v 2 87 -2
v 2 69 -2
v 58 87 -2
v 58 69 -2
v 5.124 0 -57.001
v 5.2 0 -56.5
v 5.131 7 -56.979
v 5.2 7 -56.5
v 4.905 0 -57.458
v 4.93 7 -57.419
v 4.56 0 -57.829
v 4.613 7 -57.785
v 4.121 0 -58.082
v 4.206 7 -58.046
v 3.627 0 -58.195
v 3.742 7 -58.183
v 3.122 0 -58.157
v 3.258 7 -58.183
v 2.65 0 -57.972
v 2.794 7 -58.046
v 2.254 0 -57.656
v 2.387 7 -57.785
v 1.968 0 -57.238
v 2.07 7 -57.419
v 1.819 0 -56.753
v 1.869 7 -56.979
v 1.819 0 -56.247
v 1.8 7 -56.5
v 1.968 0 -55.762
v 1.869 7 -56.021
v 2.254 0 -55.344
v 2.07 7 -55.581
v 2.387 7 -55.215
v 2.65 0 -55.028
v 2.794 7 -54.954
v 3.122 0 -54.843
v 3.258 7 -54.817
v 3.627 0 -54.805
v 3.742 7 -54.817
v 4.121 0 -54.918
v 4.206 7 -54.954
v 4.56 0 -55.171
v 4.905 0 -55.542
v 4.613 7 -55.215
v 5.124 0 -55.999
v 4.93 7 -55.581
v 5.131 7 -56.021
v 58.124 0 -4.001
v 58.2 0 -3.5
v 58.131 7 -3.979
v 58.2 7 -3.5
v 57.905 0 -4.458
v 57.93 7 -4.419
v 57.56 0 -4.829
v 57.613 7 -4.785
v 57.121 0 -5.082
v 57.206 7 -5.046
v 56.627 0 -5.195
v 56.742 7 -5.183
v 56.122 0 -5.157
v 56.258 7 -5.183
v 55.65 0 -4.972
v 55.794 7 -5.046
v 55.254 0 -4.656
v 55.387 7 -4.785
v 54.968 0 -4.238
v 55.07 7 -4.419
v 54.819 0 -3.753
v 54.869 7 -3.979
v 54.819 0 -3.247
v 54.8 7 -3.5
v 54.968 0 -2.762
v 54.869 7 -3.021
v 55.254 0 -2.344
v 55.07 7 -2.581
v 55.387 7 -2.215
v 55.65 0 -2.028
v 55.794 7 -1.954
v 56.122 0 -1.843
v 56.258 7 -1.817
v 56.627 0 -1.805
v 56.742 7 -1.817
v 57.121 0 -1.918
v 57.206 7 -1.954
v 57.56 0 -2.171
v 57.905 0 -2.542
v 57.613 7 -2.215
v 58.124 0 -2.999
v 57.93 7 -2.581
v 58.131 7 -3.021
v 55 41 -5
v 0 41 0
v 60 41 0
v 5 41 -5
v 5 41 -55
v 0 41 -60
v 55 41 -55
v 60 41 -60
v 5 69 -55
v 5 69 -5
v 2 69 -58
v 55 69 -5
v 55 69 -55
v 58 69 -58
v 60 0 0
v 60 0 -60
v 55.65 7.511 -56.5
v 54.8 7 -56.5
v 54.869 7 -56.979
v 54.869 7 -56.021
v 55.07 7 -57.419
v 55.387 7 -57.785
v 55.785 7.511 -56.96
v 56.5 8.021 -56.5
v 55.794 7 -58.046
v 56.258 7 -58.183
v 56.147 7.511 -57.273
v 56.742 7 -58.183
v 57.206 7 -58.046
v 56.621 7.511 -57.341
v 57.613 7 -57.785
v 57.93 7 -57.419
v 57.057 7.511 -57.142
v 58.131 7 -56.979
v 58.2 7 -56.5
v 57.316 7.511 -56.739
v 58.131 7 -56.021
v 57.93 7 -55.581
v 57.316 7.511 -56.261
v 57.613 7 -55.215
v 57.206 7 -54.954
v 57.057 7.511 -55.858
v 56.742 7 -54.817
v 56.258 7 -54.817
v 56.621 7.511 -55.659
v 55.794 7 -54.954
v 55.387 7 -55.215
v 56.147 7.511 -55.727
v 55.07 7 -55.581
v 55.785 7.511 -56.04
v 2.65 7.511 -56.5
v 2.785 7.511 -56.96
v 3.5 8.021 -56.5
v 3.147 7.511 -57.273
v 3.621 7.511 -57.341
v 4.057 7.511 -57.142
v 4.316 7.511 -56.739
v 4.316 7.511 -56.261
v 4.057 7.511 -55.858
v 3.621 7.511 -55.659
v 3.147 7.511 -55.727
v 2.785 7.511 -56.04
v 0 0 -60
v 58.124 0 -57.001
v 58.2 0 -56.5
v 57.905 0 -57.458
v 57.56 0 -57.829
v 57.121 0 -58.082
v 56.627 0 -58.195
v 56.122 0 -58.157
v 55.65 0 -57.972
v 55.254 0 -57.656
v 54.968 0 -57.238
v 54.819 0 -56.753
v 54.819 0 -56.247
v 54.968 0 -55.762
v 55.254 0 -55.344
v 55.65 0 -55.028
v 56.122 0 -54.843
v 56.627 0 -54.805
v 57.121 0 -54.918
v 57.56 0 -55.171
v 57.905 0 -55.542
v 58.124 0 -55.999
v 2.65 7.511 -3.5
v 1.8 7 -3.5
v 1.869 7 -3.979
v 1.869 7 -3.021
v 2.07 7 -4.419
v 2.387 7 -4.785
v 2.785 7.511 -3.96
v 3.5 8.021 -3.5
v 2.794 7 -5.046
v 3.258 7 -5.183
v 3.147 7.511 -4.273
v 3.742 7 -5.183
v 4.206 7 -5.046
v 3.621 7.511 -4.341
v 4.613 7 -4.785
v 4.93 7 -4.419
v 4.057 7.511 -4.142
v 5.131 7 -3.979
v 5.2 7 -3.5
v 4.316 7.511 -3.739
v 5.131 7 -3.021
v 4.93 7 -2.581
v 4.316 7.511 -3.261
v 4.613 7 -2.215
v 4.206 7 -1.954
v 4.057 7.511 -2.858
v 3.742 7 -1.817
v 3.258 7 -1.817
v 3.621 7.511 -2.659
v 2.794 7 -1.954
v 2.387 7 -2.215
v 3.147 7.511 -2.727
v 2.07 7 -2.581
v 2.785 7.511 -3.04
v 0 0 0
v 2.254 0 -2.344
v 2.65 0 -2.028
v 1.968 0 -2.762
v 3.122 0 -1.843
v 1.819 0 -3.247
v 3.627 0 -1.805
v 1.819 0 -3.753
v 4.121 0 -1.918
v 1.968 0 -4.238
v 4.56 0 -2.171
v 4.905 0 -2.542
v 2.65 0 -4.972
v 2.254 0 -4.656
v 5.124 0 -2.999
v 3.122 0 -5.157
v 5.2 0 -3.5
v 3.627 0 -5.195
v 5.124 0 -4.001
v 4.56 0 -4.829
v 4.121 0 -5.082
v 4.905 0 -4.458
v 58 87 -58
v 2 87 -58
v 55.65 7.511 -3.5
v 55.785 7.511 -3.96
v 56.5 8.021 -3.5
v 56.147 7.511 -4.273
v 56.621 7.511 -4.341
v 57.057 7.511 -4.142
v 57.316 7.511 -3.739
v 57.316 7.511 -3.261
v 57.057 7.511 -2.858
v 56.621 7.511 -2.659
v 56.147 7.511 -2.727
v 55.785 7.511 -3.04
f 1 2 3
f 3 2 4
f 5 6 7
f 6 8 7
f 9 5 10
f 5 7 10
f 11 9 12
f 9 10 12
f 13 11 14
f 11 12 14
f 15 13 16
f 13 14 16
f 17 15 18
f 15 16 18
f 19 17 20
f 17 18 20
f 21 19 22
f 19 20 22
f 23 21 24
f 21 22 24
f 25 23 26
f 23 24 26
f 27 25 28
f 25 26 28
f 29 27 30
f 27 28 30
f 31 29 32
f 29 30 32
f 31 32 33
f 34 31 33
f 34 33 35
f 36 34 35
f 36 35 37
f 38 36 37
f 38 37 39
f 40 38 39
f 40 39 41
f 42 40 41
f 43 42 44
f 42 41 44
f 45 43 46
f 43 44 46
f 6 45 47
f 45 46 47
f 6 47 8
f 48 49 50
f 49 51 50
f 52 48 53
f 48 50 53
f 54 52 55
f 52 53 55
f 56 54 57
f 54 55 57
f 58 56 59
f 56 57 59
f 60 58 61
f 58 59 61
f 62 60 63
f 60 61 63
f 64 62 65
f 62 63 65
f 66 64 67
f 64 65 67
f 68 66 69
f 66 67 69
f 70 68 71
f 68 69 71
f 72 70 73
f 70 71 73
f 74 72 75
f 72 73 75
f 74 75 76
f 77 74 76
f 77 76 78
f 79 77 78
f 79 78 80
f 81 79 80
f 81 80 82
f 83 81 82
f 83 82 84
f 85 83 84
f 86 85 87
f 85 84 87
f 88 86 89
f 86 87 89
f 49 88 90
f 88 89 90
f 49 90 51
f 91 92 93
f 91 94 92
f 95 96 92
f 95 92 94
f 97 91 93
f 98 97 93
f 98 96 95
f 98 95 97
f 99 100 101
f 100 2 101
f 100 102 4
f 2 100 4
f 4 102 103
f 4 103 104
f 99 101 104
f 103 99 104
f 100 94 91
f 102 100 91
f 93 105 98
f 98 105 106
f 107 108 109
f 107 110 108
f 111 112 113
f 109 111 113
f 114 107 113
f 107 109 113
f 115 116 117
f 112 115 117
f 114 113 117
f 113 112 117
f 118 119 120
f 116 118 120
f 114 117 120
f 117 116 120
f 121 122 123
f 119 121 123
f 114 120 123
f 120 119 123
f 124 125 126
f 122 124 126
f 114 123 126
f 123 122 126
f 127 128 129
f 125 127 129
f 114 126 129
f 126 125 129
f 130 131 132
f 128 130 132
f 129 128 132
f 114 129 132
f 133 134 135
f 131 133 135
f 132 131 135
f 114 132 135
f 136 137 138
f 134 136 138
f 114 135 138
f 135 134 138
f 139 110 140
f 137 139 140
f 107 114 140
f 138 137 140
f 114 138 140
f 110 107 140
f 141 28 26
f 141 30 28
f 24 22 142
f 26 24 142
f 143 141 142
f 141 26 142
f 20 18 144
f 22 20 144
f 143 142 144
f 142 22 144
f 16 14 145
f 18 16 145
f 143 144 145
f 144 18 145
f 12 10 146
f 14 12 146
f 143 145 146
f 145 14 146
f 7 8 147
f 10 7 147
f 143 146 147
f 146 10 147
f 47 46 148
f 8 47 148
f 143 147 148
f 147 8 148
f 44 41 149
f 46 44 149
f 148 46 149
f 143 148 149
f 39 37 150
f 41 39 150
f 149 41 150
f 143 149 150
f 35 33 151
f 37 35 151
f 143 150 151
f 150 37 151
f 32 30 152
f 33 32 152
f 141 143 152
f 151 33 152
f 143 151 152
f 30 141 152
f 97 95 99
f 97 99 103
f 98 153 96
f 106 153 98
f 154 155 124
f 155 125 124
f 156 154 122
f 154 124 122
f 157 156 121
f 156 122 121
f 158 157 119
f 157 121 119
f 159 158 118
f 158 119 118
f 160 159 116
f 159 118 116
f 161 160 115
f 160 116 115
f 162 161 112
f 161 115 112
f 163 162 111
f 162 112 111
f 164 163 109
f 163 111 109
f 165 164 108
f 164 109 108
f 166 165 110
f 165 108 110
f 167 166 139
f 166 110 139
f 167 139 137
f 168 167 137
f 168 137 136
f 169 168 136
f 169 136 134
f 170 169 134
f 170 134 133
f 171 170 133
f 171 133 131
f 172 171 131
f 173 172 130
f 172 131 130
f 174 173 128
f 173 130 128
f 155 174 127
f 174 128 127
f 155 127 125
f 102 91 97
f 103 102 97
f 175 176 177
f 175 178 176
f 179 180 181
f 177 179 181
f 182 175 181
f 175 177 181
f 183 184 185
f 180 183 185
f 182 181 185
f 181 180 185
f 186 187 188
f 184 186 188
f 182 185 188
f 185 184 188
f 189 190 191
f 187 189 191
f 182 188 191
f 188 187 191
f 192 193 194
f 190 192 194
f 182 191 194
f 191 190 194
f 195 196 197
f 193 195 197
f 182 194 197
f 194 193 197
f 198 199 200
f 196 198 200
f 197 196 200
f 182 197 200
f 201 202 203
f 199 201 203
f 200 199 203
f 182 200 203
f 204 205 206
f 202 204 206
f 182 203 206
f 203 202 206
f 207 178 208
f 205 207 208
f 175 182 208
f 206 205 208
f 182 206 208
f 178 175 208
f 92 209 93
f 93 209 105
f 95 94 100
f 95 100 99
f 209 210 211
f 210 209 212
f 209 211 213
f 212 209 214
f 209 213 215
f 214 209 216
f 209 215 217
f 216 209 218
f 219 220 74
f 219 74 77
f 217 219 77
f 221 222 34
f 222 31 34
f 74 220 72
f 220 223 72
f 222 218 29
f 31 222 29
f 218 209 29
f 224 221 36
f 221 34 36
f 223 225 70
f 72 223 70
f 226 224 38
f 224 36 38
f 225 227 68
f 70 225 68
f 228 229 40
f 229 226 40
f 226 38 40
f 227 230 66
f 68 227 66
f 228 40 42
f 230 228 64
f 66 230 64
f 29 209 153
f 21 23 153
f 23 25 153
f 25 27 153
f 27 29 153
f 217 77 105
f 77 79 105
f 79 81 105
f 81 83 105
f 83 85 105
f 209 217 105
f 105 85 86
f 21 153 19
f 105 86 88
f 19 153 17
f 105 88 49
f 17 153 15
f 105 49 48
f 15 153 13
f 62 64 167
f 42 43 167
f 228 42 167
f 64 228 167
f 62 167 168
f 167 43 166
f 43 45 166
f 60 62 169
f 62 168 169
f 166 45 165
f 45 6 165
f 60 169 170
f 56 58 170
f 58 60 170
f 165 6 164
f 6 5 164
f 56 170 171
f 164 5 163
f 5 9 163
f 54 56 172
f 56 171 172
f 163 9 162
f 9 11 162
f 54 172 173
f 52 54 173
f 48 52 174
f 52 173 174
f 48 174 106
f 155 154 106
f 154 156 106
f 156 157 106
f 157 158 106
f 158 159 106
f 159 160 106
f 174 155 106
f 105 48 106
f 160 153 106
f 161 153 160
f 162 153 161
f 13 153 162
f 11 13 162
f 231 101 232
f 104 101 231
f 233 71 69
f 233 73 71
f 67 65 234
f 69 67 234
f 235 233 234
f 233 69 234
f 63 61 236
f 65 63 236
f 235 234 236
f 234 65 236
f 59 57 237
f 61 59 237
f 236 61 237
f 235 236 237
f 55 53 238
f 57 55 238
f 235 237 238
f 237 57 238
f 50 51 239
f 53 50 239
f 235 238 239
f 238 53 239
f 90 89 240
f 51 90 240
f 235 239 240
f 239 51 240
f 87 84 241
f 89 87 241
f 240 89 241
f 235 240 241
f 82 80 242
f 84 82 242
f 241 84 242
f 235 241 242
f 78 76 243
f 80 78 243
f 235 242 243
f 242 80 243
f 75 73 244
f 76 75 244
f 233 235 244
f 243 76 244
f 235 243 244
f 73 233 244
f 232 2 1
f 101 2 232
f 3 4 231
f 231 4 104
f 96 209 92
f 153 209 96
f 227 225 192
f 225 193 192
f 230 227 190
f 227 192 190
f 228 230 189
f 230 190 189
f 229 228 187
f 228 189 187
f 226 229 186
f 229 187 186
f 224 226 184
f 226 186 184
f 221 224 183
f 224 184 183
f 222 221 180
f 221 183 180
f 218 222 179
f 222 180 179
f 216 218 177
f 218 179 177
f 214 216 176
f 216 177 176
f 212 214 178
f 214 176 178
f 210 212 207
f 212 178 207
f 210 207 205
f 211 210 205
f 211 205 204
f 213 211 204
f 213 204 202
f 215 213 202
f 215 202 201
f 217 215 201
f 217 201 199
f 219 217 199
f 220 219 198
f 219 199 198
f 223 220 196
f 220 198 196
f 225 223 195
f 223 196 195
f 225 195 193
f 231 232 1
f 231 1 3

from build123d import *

# Parameters (mm, degrees)
SKETCH1_W                = 60
SKETCH1_H                = 60
BOSS_EXTRUDE1_DEPTH      = 41
M3_CLEARANCE_HOLE1_D     = 3.4
M3_CLEARANCE_HOLE1_DEPTH = 7
M3_CLEARANCE_HOLE1_TIP   = 1.021463052
SKETCH4_W                = 50
SKETCH4_H                = 50
BOSS_EXTRUDE2_DEPTH      = 28
SKETCH5_W                = 56
SKETCH5_H                = 56
BOSS_EXTRUDE3_DEPTH      = 18


with BuildPart() as part:
    # Sketch1 → Boss-Extrude1 (new body)
    with BuildSketch(Plane(origin=(0, 0, 0), x_dir=(1, 0, 0), z_dir=(0, 1, 0))):
        with Locations((30, 30)):
            Rectangle(SKETCH1_W, SKETCH1_H)
    extrude(amount=BOSS_EXTRUDE1_DEPTH)

    # M3 Clearance Hole1
    with Locations(Plane(origin=(0, 0, 0), x_dir=(-1, 0, 0), z_dir=(0, -1, 0))):
        with Locations((-3.5, 3.5), (-56.5, 3.5), (-56.5, 56.5), (-3.5, 56.5)):
            Hole(M3_CLEARANCE_HOLE1_D / 2, depth=M3_CLEARANCE_HOLE1_DEPTH)
            with Locations((0, 0, -(M3_CLEARANCE_HOLE1_DEPTH + M3_CLEARANCE_HOLE1_TIP / 2))):  # 118° drill point
                Cone(0, M3_CLEARANCE_HOLE1_D / 2, M3_CLEARANCE_HOLE1_TIP, mode=Mode.SUBTRACT)

    # Sketch4 → Boss-Extrude2 (add)
    with BuildSketch(Plane(origin=(0, 41, 0), x_dir=(1, 0, 0), z_dir=(0, 1, 0))):
        with Locations((30, 30)):
            Rectangle(SKETCH4_W, SKETCH4_H)
    extrude(amount=BOSS_EXTRUDE2_DEPTH)

    # Sketch5 → Boss-Extrude3 (add)
    with BuildSketch(Plane(origin=(0, 69, 0), x_dir=(1, 0, 0), z_dir=(0, 1, 0))):
        with Locations((30, 30)):
            Rectangle(SKETCH5_W, SKETCH5_H)
    extrude(amount=BOSS_EXTRUDE3_DEPTH)


solid = part.part
